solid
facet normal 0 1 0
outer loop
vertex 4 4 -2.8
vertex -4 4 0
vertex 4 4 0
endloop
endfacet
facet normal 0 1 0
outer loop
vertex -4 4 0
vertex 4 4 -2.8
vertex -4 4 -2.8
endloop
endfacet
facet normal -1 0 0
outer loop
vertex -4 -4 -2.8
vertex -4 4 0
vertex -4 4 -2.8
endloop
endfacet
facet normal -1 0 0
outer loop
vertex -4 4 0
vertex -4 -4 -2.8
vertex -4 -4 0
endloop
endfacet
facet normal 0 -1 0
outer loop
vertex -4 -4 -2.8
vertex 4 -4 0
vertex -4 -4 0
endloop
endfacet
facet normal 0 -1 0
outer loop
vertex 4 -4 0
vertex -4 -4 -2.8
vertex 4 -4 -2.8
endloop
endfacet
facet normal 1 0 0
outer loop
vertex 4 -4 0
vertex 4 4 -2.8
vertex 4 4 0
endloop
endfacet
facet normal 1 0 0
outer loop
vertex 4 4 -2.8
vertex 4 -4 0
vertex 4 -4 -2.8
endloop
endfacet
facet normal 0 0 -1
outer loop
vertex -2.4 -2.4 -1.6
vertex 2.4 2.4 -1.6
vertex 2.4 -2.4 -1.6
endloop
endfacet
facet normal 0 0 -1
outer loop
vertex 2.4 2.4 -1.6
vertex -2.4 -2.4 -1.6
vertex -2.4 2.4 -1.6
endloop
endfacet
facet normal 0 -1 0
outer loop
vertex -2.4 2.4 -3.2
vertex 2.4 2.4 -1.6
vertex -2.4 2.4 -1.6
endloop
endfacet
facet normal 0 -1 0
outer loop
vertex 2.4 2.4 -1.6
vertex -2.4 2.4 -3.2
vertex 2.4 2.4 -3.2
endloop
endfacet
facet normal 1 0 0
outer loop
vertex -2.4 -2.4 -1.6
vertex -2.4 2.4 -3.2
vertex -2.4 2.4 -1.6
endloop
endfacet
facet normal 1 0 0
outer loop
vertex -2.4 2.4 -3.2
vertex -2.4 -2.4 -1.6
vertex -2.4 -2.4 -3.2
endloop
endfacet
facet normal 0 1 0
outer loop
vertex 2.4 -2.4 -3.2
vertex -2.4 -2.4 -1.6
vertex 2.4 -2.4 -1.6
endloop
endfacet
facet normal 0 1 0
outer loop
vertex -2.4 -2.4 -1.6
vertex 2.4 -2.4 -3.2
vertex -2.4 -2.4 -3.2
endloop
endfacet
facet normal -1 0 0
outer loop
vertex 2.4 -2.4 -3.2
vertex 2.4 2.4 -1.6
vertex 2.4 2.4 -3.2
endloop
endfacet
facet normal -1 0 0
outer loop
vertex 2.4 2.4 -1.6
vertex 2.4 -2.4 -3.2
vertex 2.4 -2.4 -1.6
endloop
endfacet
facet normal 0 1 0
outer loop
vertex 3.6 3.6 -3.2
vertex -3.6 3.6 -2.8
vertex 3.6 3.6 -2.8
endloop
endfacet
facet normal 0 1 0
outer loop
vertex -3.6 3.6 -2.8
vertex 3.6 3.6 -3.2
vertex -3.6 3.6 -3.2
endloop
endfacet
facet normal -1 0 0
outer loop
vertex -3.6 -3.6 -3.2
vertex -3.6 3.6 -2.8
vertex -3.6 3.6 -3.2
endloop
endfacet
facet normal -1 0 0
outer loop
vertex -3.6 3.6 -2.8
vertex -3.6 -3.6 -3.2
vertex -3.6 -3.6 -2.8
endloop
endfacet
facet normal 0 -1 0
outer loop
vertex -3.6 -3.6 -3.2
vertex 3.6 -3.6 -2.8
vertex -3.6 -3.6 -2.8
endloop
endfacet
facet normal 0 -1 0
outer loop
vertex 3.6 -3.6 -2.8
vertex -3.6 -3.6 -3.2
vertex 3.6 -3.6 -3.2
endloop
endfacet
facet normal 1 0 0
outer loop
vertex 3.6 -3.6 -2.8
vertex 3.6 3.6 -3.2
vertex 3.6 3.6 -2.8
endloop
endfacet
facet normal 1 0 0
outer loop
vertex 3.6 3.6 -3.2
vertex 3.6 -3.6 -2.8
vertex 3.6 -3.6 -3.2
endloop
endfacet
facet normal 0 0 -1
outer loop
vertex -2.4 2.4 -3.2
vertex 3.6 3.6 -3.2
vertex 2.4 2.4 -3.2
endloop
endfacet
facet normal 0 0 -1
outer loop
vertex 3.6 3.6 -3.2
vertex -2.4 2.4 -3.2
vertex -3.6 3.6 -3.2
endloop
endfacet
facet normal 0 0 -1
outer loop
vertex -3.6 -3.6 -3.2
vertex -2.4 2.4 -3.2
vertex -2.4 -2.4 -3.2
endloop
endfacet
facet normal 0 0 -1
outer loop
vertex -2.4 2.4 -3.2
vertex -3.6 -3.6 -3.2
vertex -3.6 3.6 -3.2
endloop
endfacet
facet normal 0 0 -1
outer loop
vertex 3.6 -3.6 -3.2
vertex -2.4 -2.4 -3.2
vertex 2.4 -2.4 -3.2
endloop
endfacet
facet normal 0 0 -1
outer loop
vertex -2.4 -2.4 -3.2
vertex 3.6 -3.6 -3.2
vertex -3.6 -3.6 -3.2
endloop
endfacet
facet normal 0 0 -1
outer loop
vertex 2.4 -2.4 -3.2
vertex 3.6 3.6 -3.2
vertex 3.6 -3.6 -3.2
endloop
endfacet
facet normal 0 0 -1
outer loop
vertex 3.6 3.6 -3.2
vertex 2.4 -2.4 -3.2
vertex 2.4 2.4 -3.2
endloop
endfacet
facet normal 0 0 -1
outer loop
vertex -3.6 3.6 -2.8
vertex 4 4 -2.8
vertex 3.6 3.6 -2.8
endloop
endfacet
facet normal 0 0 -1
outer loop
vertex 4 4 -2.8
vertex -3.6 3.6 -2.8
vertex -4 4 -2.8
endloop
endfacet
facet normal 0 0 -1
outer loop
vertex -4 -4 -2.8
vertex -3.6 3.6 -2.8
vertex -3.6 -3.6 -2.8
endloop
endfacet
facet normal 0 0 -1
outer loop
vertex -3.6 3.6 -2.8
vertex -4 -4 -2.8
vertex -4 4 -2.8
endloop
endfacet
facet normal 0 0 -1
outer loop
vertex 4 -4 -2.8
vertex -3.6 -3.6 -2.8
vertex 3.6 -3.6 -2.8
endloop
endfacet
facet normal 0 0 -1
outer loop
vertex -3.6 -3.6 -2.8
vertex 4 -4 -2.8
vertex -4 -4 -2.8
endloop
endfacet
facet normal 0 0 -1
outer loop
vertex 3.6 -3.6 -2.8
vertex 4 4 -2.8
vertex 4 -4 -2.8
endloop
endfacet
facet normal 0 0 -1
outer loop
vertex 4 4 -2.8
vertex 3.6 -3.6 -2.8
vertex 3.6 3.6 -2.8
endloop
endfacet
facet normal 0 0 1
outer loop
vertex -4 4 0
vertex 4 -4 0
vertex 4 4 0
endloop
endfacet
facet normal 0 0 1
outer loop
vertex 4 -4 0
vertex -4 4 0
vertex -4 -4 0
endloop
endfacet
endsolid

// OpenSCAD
// file: ../p/box5.scad
use <../lib.scad>
function ldraw_lib__box5() = [
// 0 Box with 5 Faces and All Edges
// 0 Name: box5.dat
// 0 Author: James Jessiman
// 0 !LDRAW_ORG Primitive UPDATE 2012-01
// 0 !LICENSE Licensed under CC BY 2.0 and CC BY 4.0 : see CAreadme.txt
// 
// 0 BFC CERTIFY CCW
  [0,"BFC","CERTIFY"],
  [0,"BFC","CCW"],
// 
// 0 !HISTORY 2002-04-03 [sbliss] Modified for BFC compliance
// 0 !HISTORY 2002-04-25 [PTadmin] Official Update 2002-02
// 0 !HISTORY 2007-06-24 [PTadmin] Header formatted for Contributor Agreement
// 0 !HISTORY 2008-07-01 [PTadmin] Official Update 2008-01
// 0 !HISTORY 2012-02-16 [Philo] Changed to CCW
// 0 !HISTORY 2012-03-30 [PTadmin] Official Update 2012-01
// 
// 
// 2 24 1 1 1 -1 1 1
  [2,24,1,1,1,-1,1,1],
// 2 24 -1 1 1 -1 1 -1
  [2,24,-1,1,1,-1,1,-1],
// 2 24 -1 1 -1 1 1 -1
  [2,24,-1,1,-1,1,1,-1],
// 2 24 1 1 -1 1 1 1
  [2,24,1,1,-1,1,1,1],
// 2 24 1 0 1 -1 0 1
  [2,24,1,0,1,-1,0,1],
// 2 24 -1 0 1 -1 0 -1
  [2,24,-1,0,1,-1,0,-1],
// 2 24 -1 0 -1 1 0 -1
  [2,24,-1,0,-1,1,0,-1],
// 2 24 1 0 -1 1 0 1
  [2,24,1,0,-1,1,0,1],
// 2 24 1 0 1 1 1 1
  [2,24,1,0,1,1,1,1],
// 2 24 -1 0 1 -1 1 1
  [2,24,-1,0,1,-1,1,1],
// 2 24 1 0 -1 1 1 -1
  [2,24,1,0,-1,1,1,-1],
// 2 24 -1 0 -1 -1 1 -1
  [2,24,-1,0,-1,-1,1,-1],
// 4 16 -1 1 1 1 1 1 1 1 -1 -1 1 -1
  [4,16,-1,1,1,1,1,1,1,1,-1,-1,1,-1],
// 4 16 -1 1 1 -1 0 1 1 0 1 1 1 1
  [4,16,-1,1,1,-1,0,1,1,0,1,1,1,1],
// 4 16 -1 1 -1 -1 0 -1 -1 0 1 -1 1 1
  [4,16,-1,1,-1,-1,0,-1,-1,0,1,-1,1,1],
// 4 16 1 1 -1 1 0 -1 -1 0 -1 -1 1 -1
  [4,16,1,1,-1,1,0,-1,-1,0,-1,-1,1,-1],
// 4 16 1 1 1 1 0 1 1 0 -1 1 1 -1
  [4,16,1,1,1,1,0,1,1,0,-1,1,1,-1],
];
makepoly(ldraw_lib__box5(), line=0.2);
// file: ../p/box4.scad
use <../lib.scad>
function ldraw_lib__box4() = [
// 0 Box with 4 Faces (2 Parallel Pairs) and All Edges
// 0 Name: box4.dat
// 0 Author: James Jessiman
// 0 !LDRAW_ORG Primitive UPDATE 2012-01
// 0 !LICENSE Licensed under CC BY 2.0 and CC BY 4.0 : see CAreadme.txt
// 
// 0 BFC CERTIFY CCW
  [0,"BFC","CERTIFY"],
  [0,"BFC","CCW"],
// 
// 0 !HISTORY 2002-04-03 [sbliss] Modified for BFC compliance
// 0 !HISTORY 2002-04-25 [PTadmin] Official Update 2002-02
// 0 !HISTORY 2007-06-24 [PTadmin] Header formatted for Contributor Agreement
// 0 !HISTORY 2008-07-01 [PTadmin] Official Update 2008-01
// 0 !HISTORY 2012-02-16 [Philo] Changed to CCW
// 0 !HISTORY 2012-03-30 [PTadmin] Official Update 2012-01
// 
// 
// 2 24 1 1 1 -1 1 1
  [2,24,1,1,1,-1,1,1],
// 2 24 -1 1 1 -1 1 -1
  [2,24,-1,1,1,-1,1,-1],
// 2 24 -1 1 -1 1 1 -1
  [2,24,-1,1,-1,1,1,-1],
// 2 24 1 1 -1 1 1 1
  [2,24,1,1,-1,1,1,1],
// 2 24 1 0 1 -1 0 1
  [2,24,1,0,1,-1,0,1],
// 2 24 -1 0 1 -1 0 -1
  [2,24,-1,0,1,-1,0,-1],
// 2 24 -1 0 -1 1 0 -1
  [2,24,-1,0,-1,1,0,-1],
// 2 24 1 0 -1 1 0 1
  [2,24,1,0,-1,1,0,1],
// 2 24 1 0 1 1 1 1
  [2,24,1,0,1,1,1,1],
// 2 24 -1 0 1 -1 1 1
  [2,24,-1,0,1,-1,1,1],
// 2 24 1 0 -1 1 1 -1
  [2,24,1,0,-1,1,1,-1],
// 2 24 -1 0 -1 -1 1 -1
  [2,24,-1,0,-1,-1,1,-1],
// 4 16 -1 1 1 -1 0 1 1 0 1 1 1 1
  [4,16,-1,1,1,-1,0,1,1,0,1,1,1,1],
// 4 16 -1 1 -1 -1 0 -1 -1 0 1 -1 1 1
  [4,16,-1,1,-1,-1,0,-1,-1,0,1,-1,1,1],
// 4 16 1 1 -1 1 0 -1 -1 0 -1 -1 1 -1
  [4,16,1,1,-1,1,0,-1,-1,0,-1,-1,1,-1],
// 4 16 1 1 1 1 0 1 1 0 -1 1 1 -1
  [4,16,1,1,1,1,0,1,1,0,-1,1,1,-1],
];
makepoly(ldraw_lib__box4(), line=0.2);
// file: s/3070bs01.scad
use <../../lib.scad>
use <../../p/box4.scad>
use <../../p/box5.scad>
function ldraw_lib__s__3070bs01() = [
// 0 ~Tile  1 x  1 with Groove without Top Face
// 0 Name: s\3070bs01.dat
// 0 Author: Chris Dee [cwdee]
// 0 !LDRAW_ORG Subpart UPDATE 2009-02
// 0 !LICENSE Licensed under CC BY 2.0 and CC BY 4.0 : see CAreadme.txt
// 
// 0 BFC CERTIFY CCW
  [0,"BFC","CERTIFY"],
  [0,"BFC","CCW"],
// 
// 0 !HISTORY 2009-09-03 [PTadmin] Official Update 2009-02
// 
// 
// 1 16 0 0 0 10 0 0 0 7 0 0 0 10 box4.dat
  [1,16,0,0,0,10,0,0,0,7,0,0,0,10, ldraw_lib__box4()],
// 0 BFC INVERTNEXT
  [0,"BFC","INVERTNEXT"],
// 1 16 0 8 0 6 0 0 0 -4 0 0 0 6 box5.dat
  [1,16,0,8,0,6,0,0,0,-4,0,0,0,6, ldraw_lib__box5()],
// 1 16 0 7 0 9 0 0 0 1 0 0 0 9 box4.dat
  [1,16,0,7,0,9,0,0,0,1,0,0,0,9, ldraw_lib__box4()],
// 
// 4 16 9 8 9 6 8 6 -6 8 6 -9 8 9
  [4,16,9,8,9,6,8,6,-6,8,6,-9,8,9],
// 4 16 -9 8 9 -6 8 6 -6 8 -6 -9 8 -9
  [4,16,-9,8,9,-6,8,6,-6,8,-6,-9,8,-9],
// 4 16 -9 8 -9 -6 8 -6 6 8 -6 9 8 -9
  [4,16,-9,8,-9,-6,8,-6,6,8,-6,9,8,-9],
// 4 16 9 8 -9 6 8 -6 6 8 6 9 8 9
  [4,16,9,8,-9,6,8,-6,6,8,6,9,8,9],
// 
// 4 16 10 7 10 9 7 9 -9 7 9 -10 7 10
  [4,16,10,7,10,9,7,9,-9,7,9,-10,7,10],
// 4 16 -10 7 10 -9 7 9 -9 7 -9 -10 7 -10
  [4,16,-10,7,10,-9,7,9,-9,7,-9,-10,7,-10],
// 4 16 -10 7 -10 -9 7 -9 9 7 -9 10 7 -10
  [4,16,-10,7,-10,-9,7,-9,9,7,-9,10,7,-10],
// 4 16 10 7 -10 9 7 -9 9 7 9 10 7 10
  [4,16,10,7,-10,9,7,-9,9,7,9,10,7,10],
// 0
];
makepoly(ldraw_lib__s__3070bs01(), line=0.2);
// main file
use <../lib.scad>
use <s/3070bs01.scad>
function ldraw_lib__3070bpf1() = [
// 0 Tile  1 x  1 with Red Top Pattern
// 0 Name: 3070bpf1.dat
// 0 Author: Niels Karsdorp [nielsk]
// 0 !LDRAW_ORG Part UPDATE 2004-03
// 0 !LICENSE Licensed under CC BY 2.0 and CC BY 4.0 : see CAreadme.txt
// 
// 0 BFC CERTIFY CCW
  [0,"BFC","CERTIFY"],
  [0,"BFC","CCW"],
// 
// 0 !HISTORY 2004-09-15 [PTadmin] Official Update 2004-03
// 0 !HISTORY 2007-10-13 [PTadmin] Header formatted for Contributor Agreement
// 0 !HISTORY 2008-07-01 [PTadmin] Official Update 2008-01
// 
// 
// 1 16 0 0 0 1 0 0 0 1 0 0 0 1 s\3070bs01.dat
  [1,16,0,0,0,1,0,0,0,1,0,0,0,1, ldraw_lib__s__3070bs01()],
// 4 4 -10 0 -10 10 0 -10 10 0 10 -10 0 10
  [4,4,-10,0,-10,10,0,-10,10,0,10,-10,0,10],
// 0
];
makepoly(ldraw_lib__3070bpf1(), line=0.2);
